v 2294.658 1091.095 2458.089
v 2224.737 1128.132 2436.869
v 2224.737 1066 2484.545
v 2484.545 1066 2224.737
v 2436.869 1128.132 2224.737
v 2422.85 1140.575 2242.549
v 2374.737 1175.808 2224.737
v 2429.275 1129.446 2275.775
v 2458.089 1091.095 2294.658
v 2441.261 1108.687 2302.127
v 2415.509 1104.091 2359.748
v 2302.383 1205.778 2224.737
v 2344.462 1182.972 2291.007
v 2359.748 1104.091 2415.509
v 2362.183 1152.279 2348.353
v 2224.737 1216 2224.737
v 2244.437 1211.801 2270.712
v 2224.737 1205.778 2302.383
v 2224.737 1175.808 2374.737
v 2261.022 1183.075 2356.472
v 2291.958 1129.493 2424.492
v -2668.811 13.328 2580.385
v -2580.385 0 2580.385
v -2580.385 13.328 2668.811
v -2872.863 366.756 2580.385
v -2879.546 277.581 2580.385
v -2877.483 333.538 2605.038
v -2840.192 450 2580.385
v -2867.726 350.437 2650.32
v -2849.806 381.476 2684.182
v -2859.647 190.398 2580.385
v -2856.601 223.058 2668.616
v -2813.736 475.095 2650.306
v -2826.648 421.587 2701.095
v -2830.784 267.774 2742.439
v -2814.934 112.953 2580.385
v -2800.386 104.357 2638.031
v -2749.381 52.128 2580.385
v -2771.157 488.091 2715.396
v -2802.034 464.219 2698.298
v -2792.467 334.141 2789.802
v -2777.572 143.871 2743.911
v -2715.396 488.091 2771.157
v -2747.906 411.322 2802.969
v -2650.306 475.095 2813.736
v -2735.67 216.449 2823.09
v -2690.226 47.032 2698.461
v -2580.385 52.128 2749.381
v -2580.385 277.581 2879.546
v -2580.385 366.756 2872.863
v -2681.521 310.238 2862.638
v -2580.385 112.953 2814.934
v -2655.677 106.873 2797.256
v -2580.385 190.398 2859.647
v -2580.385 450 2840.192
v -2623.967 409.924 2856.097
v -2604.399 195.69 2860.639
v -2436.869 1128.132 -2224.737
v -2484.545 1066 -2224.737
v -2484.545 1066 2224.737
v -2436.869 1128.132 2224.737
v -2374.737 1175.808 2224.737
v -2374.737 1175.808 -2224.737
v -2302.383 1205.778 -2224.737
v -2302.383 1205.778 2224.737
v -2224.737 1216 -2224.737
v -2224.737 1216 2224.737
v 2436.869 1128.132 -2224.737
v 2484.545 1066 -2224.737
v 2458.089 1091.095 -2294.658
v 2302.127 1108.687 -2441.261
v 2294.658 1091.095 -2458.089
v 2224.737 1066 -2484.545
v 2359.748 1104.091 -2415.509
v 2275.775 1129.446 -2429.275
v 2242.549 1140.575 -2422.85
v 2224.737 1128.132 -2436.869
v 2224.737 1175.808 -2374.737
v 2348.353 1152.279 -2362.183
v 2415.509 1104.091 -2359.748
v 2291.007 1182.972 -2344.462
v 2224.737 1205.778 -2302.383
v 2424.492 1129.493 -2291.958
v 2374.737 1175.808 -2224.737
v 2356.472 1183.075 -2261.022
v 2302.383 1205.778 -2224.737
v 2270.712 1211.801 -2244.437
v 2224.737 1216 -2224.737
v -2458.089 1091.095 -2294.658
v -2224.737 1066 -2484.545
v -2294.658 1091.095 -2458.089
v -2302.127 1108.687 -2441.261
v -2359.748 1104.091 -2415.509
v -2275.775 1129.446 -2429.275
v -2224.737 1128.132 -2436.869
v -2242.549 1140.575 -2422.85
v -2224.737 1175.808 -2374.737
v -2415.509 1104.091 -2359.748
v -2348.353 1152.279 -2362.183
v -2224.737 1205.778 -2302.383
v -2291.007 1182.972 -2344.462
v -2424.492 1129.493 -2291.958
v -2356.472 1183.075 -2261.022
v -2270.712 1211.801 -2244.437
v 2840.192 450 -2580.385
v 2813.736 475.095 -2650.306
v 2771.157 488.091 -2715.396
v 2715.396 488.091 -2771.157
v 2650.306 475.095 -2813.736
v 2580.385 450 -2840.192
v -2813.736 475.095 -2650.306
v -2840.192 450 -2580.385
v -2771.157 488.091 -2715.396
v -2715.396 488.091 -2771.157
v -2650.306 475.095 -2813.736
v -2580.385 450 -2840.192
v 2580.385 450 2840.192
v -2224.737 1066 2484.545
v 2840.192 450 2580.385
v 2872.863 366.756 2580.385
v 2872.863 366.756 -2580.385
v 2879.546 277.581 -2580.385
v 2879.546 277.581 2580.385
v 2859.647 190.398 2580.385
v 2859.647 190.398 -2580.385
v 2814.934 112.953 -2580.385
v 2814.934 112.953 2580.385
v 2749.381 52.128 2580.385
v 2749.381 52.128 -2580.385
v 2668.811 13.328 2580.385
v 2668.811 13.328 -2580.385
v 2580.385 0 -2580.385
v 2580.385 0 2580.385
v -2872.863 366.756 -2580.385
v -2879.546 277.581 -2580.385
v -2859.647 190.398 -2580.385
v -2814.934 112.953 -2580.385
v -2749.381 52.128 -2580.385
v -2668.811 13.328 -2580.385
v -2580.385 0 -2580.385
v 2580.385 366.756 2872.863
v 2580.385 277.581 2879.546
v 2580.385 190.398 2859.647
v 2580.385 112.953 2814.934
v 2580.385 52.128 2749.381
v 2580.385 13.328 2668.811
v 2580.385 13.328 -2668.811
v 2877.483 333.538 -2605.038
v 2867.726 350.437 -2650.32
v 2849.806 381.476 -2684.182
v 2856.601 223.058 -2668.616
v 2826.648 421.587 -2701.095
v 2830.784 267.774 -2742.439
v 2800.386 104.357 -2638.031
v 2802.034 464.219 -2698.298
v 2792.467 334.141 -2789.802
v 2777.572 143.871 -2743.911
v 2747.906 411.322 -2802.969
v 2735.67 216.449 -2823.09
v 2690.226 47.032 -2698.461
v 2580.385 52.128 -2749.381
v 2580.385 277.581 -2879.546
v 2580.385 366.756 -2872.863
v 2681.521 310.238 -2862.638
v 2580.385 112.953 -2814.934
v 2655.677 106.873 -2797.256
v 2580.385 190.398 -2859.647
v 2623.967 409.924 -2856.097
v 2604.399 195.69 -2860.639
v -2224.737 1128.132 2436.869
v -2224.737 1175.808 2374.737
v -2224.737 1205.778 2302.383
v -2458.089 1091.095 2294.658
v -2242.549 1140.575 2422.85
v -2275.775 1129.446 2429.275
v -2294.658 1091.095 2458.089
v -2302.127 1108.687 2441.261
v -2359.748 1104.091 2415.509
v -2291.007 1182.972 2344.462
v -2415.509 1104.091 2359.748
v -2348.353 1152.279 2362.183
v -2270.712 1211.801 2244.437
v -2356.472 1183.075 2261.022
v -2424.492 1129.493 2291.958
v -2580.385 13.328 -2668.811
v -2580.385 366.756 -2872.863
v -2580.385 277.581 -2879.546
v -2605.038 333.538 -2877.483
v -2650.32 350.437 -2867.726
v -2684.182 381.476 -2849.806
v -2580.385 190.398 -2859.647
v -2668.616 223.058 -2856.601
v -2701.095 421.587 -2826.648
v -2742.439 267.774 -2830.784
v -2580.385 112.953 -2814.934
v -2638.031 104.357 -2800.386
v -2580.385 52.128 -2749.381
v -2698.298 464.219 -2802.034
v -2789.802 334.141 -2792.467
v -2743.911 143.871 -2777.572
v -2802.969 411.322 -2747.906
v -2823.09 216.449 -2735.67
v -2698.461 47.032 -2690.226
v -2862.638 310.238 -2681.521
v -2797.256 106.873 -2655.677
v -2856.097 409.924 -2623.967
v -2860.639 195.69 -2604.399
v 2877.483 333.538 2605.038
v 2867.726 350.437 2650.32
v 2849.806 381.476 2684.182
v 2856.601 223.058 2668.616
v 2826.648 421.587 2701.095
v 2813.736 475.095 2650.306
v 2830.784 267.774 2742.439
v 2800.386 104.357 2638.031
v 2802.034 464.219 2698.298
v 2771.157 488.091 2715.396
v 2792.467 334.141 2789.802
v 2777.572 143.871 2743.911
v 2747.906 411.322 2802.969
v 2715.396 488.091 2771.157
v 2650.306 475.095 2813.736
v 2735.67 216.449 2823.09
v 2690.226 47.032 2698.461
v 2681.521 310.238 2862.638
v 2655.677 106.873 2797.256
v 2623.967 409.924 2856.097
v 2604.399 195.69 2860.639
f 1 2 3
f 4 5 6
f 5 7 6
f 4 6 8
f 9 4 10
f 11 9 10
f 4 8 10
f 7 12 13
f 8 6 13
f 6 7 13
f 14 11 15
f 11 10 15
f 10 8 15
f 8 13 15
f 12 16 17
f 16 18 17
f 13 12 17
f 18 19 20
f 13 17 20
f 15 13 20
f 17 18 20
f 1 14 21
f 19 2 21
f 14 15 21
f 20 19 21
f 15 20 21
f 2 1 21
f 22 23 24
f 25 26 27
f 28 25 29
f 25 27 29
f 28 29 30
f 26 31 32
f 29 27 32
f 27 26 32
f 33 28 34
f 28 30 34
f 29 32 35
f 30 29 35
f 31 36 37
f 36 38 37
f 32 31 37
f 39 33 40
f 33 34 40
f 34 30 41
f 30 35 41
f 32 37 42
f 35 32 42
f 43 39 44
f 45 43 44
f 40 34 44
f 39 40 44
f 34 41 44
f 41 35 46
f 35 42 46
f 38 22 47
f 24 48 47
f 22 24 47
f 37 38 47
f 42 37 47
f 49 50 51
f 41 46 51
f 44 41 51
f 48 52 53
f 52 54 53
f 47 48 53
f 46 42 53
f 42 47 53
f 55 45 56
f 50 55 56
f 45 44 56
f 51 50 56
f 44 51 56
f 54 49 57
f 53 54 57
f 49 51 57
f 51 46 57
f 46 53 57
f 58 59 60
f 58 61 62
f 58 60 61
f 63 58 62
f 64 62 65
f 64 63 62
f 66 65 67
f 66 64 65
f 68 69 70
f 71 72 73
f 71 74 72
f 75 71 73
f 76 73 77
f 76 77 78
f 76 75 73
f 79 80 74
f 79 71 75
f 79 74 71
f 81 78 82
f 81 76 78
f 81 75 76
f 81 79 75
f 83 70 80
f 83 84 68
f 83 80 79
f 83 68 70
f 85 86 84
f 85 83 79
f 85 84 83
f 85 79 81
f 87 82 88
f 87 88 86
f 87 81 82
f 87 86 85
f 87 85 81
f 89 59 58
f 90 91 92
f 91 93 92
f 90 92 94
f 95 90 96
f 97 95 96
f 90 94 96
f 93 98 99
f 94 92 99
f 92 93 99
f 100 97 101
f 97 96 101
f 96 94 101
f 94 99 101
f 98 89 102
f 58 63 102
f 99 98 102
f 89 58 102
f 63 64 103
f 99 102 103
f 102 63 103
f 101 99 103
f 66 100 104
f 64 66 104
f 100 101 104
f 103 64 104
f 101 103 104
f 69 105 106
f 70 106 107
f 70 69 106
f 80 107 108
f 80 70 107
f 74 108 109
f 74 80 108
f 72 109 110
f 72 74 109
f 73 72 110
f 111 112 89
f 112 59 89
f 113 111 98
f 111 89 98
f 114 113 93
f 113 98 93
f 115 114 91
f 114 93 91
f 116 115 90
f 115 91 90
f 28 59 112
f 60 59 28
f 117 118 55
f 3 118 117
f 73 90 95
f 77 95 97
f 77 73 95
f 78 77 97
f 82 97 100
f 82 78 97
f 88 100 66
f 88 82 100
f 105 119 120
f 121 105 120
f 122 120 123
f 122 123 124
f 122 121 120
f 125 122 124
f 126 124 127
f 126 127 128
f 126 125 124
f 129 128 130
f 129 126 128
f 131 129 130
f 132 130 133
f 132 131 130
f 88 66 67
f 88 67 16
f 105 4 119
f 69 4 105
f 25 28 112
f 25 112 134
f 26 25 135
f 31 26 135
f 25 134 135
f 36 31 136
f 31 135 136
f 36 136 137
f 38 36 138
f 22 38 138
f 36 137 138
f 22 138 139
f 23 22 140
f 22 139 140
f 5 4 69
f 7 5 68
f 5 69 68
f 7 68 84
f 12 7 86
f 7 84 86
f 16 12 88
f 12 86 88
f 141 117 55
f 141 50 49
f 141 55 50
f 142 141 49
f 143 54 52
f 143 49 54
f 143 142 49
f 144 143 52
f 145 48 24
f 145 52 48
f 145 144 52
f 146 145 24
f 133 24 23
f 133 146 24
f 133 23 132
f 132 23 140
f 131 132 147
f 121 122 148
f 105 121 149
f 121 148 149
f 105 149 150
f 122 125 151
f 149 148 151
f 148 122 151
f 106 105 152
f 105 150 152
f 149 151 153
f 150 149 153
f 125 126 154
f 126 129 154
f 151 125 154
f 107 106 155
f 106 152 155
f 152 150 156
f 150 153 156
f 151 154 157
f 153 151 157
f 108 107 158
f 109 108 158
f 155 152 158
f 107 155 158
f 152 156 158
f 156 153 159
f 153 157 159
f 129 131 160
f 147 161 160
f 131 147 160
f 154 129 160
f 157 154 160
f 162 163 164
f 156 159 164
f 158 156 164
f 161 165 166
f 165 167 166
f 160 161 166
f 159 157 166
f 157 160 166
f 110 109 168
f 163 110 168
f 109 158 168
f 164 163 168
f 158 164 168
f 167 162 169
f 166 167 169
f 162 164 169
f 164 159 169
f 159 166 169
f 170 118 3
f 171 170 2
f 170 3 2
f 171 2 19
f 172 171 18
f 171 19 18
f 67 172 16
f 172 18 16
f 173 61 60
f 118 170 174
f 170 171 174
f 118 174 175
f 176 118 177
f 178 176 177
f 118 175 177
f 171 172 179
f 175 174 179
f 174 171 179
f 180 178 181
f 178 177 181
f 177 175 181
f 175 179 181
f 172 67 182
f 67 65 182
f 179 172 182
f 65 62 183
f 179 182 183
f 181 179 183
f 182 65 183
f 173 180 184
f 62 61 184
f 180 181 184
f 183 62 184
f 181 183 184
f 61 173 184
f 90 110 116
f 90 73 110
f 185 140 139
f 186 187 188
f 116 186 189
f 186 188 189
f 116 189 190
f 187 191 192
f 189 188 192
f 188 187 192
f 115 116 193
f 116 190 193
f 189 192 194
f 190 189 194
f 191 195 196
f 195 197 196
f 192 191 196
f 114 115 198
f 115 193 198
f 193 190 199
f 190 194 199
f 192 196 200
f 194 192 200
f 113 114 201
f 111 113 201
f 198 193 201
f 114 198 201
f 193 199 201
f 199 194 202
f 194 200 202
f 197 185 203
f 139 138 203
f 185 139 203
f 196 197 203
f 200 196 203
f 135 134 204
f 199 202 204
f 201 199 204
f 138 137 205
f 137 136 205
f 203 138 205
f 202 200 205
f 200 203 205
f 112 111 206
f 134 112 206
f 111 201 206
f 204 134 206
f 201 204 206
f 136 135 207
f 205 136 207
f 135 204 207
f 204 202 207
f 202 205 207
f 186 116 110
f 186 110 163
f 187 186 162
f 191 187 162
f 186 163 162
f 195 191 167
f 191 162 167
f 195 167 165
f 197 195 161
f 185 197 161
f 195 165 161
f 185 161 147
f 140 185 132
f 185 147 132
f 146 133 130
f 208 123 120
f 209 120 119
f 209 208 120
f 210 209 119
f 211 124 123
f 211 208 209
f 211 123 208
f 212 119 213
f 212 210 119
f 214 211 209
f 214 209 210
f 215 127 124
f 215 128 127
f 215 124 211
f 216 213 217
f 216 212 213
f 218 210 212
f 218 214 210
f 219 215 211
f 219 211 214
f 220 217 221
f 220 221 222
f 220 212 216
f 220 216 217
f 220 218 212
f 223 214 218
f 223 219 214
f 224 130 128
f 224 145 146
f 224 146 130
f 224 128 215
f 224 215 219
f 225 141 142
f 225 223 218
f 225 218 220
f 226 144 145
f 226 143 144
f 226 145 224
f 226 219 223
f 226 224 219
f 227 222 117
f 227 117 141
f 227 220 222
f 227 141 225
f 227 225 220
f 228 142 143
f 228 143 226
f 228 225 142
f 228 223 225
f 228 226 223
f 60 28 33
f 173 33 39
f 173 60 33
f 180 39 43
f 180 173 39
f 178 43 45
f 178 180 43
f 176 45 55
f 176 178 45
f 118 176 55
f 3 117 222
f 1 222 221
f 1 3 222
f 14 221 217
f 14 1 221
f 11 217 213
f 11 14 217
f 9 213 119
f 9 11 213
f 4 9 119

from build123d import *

# Parameters (mm, degrees)
SKETCH2_W           = 6200
SKETCH2_H           = 6200
BOSS_EXTRUDE1_DEPTH = 1216
BOSS_EXTRUDE1_TAPER = 30
FILLET1_R           = 300


with BuildPart() as part:
    # Sketch2 → Boss-Extrude1 (new body)
    with BuildSketch(Plane(origin=(0, 0, 0), x_dir=(1, 0, 0), z_dir=(0, 1, 0))):
        Rectangle(SKETCH2_W, SKETCH2_H)
    extrude(amount=BOSS_EXTRUDE1_DEPTH, taper=BOSS_EXTRUDE1_TAPER)

    # Fillet1
    fillet1_edges = [part.edges().sort_by_distance(p)[0] for p in [
        (-2397.942072665, 1216, 0),
        (0, 1216, 2397.942072665),
        (2397.942072665, 1216, 0),
        (0, 0, 3100),
        (-3100, 0, 0),
        (0, 0, -3100),
        (3100, 0, 0),
        (2748.971036333, 608, 2748.971036333),
        (-2748.971036333, 608, 2748.971036333),
        (-2748.971036333, 608, -2748.971036333),
        (2748.971036333, 608, -2748.971036333),
        (0, 1216, -2397.942072665),
    ]]
    fillet(fillet1_edges, radius=FILLET1_R)


solid = part.part
